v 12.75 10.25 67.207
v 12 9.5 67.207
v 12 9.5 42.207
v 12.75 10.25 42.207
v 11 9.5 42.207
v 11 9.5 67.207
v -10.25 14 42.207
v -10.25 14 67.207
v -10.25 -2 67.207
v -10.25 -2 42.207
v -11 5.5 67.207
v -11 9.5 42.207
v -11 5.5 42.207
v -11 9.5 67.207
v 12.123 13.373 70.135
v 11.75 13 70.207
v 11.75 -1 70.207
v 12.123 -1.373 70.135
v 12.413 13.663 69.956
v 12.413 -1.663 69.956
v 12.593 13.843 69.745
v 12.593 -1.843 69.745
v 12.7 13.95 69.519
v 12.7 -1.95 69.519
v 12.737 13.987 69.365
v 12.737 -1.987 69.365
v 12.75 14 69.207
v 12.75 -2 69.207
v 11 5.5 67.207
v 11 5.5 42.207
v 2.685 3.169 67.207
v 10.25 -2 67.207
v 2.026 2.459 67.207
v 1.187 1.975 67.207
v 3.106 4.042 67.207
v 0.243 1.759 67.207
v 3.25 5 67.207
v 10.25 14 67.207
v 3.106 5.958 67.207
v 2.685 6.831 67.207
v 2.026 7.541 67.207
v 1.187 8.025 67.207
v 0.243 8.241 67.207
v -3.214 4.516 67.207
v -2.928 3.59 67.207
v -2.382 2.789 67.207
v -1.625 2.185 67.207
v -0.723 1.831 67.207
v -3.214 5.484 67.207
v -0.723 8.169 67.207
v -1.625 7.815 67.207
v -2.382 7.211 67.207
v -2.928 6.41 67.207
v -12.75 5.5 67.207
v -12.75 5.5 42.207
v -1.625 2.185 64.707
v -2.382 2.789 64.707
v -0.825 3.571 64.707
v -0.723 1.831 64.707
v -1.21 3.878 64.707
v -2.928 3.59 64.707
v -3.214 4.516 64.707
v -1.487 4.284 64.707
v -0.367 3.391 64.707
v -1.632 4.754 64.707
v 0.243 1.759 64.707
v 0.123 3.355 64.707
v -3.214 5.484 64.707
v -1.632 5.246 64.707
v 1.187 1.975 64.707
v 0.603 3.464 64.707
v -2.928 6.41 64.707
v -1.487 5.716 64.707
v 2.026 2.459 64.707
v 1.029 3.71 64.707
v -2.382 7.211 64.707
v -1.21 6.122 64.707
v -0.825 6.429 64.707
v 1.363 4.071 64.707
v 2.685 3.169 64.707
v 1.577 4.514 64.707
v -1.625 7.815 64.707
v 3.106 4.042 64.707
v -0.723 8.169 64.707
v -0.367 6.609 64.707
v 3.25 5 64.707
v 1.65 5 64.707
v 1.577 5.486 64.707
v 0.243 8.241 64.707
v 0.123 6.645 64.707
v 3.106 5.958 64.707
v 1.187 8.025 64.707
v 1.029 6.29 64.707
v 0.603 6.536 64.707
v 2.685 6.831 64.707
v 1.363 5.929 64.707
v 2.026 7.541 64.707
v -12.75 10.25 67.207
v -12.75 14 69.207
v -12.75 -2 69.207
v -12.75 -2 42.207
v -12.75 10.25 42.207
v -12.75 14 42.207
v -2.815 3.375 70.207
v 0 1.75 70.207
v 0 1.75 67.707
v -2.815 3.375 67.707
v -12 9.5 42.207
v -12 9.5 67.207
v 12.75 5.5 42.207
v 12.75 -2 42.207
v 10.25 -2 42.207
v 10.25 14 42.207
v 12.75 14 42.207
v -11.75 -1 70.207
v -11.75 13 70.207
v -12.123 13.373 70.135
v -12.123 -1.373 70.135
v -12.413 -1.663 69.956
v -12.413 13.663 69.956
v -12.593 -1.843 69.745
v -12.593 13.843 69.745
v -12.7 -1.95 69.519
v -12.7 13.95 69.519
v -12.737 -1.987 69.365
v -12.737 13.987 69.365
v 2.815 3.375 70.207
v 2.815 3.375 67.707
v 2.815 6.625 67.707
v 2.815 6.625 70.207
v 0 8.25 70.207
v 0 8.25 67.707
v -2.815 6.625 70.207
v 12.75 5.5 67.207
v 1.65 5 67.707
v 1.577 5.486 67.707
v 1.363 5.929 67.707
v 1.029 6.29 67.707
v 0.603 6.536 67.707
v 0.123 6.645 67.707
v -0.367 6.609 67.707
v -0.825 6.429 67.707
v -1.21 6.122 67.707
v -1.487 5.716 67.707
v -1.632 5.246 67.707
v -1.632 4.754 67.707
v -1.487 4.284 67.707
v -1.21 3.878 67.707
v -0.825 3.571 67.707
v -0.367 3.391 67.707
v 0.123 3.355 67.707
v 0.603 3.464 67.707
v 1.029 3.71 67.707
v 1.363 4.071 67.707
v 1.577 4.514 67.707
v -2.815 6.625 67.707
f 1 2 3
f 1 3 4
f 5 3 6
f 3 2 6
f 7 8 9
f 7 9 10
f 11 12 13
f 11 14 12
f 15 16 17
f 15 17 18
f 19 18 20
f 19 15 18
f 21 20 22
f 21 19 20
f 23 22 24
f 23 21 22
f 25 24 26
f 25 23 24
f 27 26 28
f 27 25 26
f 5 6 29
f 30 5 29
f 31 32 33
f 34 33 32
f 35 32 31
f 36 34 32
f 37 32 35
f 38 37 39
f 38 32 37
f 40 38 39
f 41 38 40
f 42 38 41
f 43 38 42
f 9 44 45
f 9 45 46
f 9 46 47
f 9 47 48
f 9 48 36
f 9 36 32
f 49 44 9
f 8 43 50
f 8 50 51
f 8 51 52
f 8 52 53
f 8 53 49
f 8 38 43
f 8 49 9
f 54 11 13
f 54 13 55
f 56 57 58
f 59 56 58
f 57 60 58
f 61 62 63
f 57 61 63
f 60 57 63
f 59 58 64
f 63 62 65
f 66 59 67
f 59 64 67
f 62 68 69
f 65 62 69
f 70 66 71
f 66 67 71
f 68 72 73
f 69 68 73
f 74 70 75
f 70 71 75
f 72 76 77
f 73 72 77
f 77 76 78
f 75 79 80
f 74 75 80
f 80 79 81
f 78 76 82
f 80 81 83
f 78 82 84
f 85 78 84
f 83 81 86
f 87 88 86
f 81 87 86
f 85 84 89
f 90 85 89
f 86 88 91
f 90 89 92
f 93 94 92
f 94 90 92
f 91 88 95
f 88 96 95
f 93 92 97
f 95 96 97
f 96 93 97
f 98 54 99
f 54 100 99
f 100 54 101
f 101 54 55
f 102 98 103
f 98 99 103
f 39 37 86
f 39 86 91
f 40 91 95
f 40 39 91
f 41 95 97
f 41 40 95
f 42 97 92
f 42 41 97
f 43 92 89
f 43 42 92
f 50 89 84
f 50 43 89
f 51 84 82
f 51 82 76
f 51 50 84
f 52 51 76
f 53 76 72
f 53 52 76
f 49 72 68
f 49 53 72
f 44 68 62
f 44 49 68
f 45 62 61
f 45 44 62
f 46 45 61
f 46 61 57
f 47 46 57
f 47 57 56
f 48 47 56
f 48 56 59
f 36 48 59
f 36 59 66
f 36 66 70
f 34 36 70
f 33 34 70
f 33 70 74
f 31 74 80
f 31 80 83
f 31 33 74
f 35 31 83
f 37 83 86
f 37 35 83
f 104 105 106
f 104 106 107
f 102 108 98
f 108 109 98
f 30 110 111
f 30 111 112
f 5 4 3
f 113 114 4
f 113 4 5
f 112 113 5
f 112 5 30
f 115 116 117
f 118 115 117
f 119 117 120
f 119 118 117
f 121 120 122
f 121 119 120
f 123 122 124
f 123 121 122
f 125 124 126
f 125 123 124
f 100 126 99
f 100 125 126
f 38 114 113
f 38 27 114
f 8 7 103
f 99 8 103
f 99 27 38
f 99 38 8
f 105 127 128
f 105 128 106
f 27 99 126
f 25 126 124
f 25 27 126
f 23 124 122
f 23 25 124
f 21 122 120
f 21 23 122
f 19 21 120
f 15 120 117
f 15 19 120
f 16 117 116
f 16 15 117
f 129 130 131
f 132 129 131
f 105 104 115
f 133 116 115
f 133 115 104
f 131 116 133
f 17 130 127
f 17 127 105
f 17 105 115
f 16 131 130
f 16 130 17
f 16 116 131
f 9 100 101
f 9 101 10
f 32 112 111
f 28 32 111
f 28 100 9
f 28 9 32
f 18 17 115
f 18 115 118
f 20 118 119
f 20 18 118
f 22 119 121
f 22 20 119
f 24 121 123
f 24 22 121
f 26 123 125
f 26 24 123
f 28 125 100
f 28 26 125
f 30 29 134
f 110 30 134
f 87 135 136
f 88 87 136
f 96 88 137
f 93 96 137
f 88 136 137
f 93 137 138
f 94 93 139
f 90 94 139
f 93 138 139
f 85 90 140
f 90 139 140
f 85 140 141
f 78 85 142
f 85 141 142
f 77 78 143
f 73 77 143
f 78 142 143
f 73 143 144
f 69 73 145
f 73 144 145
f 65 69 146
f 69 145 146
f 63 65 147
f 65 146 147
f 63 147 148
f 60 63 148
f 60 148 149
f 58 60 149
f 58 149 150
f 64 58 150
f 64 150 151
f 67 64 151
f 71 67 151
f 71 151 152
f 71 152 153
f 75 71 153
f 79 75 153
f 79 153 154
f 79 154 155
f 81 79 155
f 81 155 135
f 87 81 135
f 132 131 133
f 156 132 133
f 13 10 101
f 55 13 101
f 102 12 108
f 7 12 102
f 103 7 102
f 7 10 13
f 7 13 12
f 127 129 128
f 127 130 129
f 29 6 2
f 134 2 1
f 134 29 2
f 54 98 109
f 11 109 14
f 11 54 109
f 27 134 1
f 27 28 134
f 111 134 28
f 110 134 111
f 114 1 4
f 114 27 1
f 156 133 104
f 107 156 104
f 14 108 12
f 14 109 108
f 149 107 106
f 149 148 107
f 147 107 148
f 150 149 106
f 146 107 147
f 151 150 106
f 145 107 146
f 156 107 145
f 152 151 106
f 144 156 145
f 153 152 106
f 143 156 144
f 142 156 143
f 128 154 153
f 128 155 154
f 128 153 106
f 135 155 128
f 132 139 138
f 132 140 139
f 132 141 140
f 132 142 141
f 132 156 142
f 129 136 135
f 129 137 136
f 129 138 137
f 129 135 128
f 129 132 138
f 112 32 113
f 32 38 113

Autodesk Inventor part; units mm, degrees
ref_plane "YZ Plane" through (0, 0, 0) normal (1, 0, 0) x (0, 1, 0)
ref_plane "XZ Plane" through (0, 0, 0) normal (0, 1, 0) x (-1, 0, 0)
ref_plane "XY Plane" through (0, 0, 0) normal (0, 0, 1) x (1, 0, 0)
sketch "Эскиз1" plane through (0, 0, 0) normal (0, 1, 0) x (-1, 0, 0)
  line L0 (0, 56.6418) -> (23.7825, 76.5969) construction
  line L1 (44.1942, 76.014) -> (76.014, 44.1942) construction
  line L2 (91.1, 52.2091) -> (52.2091, 91.1) construction
  line L3 (0, 0) -> (74.2462, 74.2462) construction
  arc A0 (92.5543, 49.5852) -> (48.7014, 93.0224) centre (0, 0) ccw construction
  line L4 (52.2091, 91.1) -> (48.6736, 87.5645) construction
  arc A1 (44.1942, 83.085) -> (44.1942, 76.014) centre (47.7297, 79.5495) ccw construction
  line L5 (52.2091, 91.1) -> (48.6736, 87.5645) construction
  line L6 (48.6736, 87.5645) -> (52.2091, 91.1) construction
  spline S0 degree 2 poles (48.6736, 87.5645) (52.2091, 91.1) (48.7014, 93.0224) knots 1 1 1 2 2 2 construction
  line L7 (52.2091, 91.1) -> (48.7014, 93.0224) construction
  line L8 (52.2091, 91.1) -> (48.7014, 93.0224) construction
  arc A2 (48.7014, 93.0224) -> (44.0271, 95.3237) centre (0, 0) ccw construction
  arc A3 (44.0271, 95.3237) -> (43.577, 95.5303) centre (0, 0) ccw construction
  line L9 (42.6652, 95.941) -> (43.577, 95.5303) construction
  line L10 (42.6652, 95.941) -> (43.577, 95.5303) construction
  spline S1 degree 2 poles (42.0492, 94.5734) (42.6652, 95.941) (43.577, 95.5303) knots 1 1 1 2 2 2 construction
  line L11 (42.0492, 94.5734) -> (42.6652, 95.941) construction
  line L12 (42.6652, 95.941) -> (42.0492, 94.5734) construction
  line L13 (0, 0) -> (0, 209.8821) construction
  spline S2 degree 2 poles (-48.6736, 87.5645) (-52.2091, 91.1) (-48.7014, 93.0224) knots 1 1 1 2 2 2 construction
  line L14 (-48.6736, 87.5645) -> (-52.2091, 91.1) construction
  line L15 (-52.2091, 91.1) -> (-48.7014, 93.0224) construction
  arc A4 (-44.1942, 76.014) -> (-44.1942, 83.085) centre (-47.7297, 79.5495) ccw construction
  line L16 (-44.1942, 76.014) -> (-76.014, 44.1942) construction
  arc A5 (-48.7014, 93.0224) -> (-92.5543, 49.5852) centre (0, 0) ccw construction
  arc A6 (-83.085, 44.1942) -> (-76.014, 44.1942) centre (-79.5495, 47.7297) ccw construction
  line L17 (-83.085, 44.1942) -> (-87.3563, 48.4654) construction
  spline S3 degree 2 poles (-48.6736, -87.5645) (-52.2091, -91.1) (-48.7014, -93.0224) knots 1 1 1 2 2 2 construction
  line L18 (-48.6736, -87.5645) -> (-52.2091, -91.1) construction
  line L19 (-52.2091, -91.1) -> (-48.7014, -93.0224) construction
  circle A7 centre (0, 0) radius 35 construction
  line L20 (-46.3155, -73.8927) -> (-73.8927, -46.3155) construction
  arc A8 (-73.8927, -46.3155) -> (-85.2064, -46.3155) centre (-79.5495, -51.9723) ccw construction
  line L21 (-85.2064, -46.3155) -> (-87.5645, -48.6736) construction
  line L22 (-87.5645, -48.6736) -> (-91.1, -52.2091) construction
  spline S4 degree 2 poles (-87.5645, -48.6736) (-91.1, -52.2091) (-92.5543, -49.5852) knots 1 1 1 2 2 2 construction
  line L23 (-91.1, -52.2091) -> (-92.5543, -49.5852) construction
  arc A9 (-92.5543, -49.5852) -> (-48.7014, -93.0224) centre (0, 0) ccw construction
  arc A10 (-92.5543, 49.5852) -> (-92.5543, -49.5852) centre (0, 0) ccw construction
  line L24 (48.6736, -87.5645) -> (46.3155, -85.2064) construction
  arc A11 (-46.3155, -85.2064) -> (-46.3155, -73.8927) centre (-51.9723, -79.5495) ccw construction
  line L25 (-48.6736, -87.5645) -> (-46.3155, -85.2064) construction
  arc A12 (-48.7014, -93.0224) -> (48.7014, -93.0224) centre (0, 0) ccw construction
  arc A13 (46.3155, -73.8927) -> (46.3155, -85.2064) centre (51.9723, -79.5495) ccw construction
  arc A14 (43.577, 95.5303) -> (-43.577, 95.5303) centre (0, 0) ccw construction
  arc A15 (23.7825, 76.5969) -> (0, 67.941) centre (0, 104.941) ccw construction
  line L26 (0, 56.6418) -> (-35.5516, 86.4744) construction
  line L27 (44.0271, 95.3237) -> (44.0271, 127.8162) construction
  ellipse E0 centre (0, 102.7511) end of major axis (44.0271, 102.7511) minor radius 27.5932 (42.0492, 94.5734) -> (35.2734, 86.2384) ccw construction
  line L28 (42.6652, 95.941) -> (-42.6652, 95.941) construction
  ellipse E1 centre (0, 102.7511) end of major axis (44.5159, 105.2445) minor radius 28.887 (35.2734, 86.2384) -> (42.0492, 94.5734) ccw construction
  line L29 (23.7825, 76.5969) -> (35.2734, 86.2384) construction
  arc A16 (0, 67.941) -> (23.7825, 76.5969) centre (0, 104.941) ccw construction
  arc A17 (-23.7825, 76.5969) -> (0, 67.941) centre (0, 104.941) ccw construction
  line L30 (-23.7825, 76.5969) -> (-35.2734, 86.2384) construction
  line L31 (-42.6652, 95.941) -> (-42.0492, 94.5734) construction
  arc A18 (-43.577, 95.5303) -> (-48.7014, 93.0224) centre (0, 0) ccw construction
  line L32 (-42.6652, 95.941) -> (-43.577, 95.5303) construction
  spline S5 degree 2 poles (-42.0492, 94.5734) (-42.6652, 95.941) (-43.577, 95.5303) knots 1 1 1 2 2 2 construction
  line L33 (-42.0492, 94.5734) -> (-42.6652, 95.941) construction
  line L34 (-42.6652, 95.941) -> (-43.577, 95.5303) construction
  line L35 (-42.6652, 95.941) -> (-43.577, 95.5303) construction
  spline S6 degree 2 poles (-42.0492, 94.5734) (-42.6652, 95.941) (-43.577, 95.5303) knots 1 1 1 2 2 2 construction
  line L36 (-42.0492, 94.5734) -> (-42.6652, 95.941) construction
  ellipse E2 centre (0, 102.7511) end of major axis (-44.5159, 105.2445) minor radius 28.887 (-42.0492, 94.5734) -> (-35.2734, 86.2384) ccw construction
  line L37 (83.085, 44.1942) -> (87.5645, 48.6736) construction
  arc A19 (76.014, 44.1942) -> (83.085, 44.1942) centre (79.5495, 47.7297) ccw construction
  spline S7 degree 2 poles (48.6736, -87.5645) (52.2091, -91.1) (48.7014, -93.0224) knots 1 1 1 2 2 2 construction
  line L38 (48.6736, -87.5645) -> (52.2091, -91.1) construction
  line L39 (52.2091, -91.1) -> (48.7014, -93.0224) construction
  line L40 (46.3155, -73.8927) -> (73.8927, -46.3155) construction
  arc A20 (85.2064, -46.3155) -> (73.8927, -46.3155) centre (79.5495, -51.9723) ccw construction
  line L41 (85.2064, -46.3155) -> (87.5645, -48.6736) construction
  spline S8 degree 2 poles (87.5645, -48.6736) (91.1, -52.2091) (92.5543, -49.5852) knots 1 1 1 2 2 2 construction
  line L42 (87.5645, -48.6736) -> (91.1, -52.2091) construction
  line L43 (91.1, -52.2091) -> (92.5543, -49.5852) construction
  arc A21 (92.5543, -49.5852) -> (92.5543, 49.5852) centre (0, 0) ccw construction
  arc A22 (48.7014, -93.0224) -> (92.5543, -49.5852) centre (0, 0) ccw construction
  arc A23 (28.5452, 71.4571) -> (-28.5452, 71.4571) centre (0, 104.941) ccw construction
  line L44 (-83.085, 34.2947) -> (-90.6891, 41.8987) construction
  line L45 (-93.5297, 47.6709) -> (-92.5543, 49.5852) construction
  line L46 (-29.1816, 81.127) -> (-76.014, 34.2947) construction
  arc A24 (-83.085, 34.2947) -> (-76.014, 34.2947) centre (-79.5495, 37.8302) ccw construction
  line L47 (-34.1491, 76.1596) -> (-28.5452, 71.4571) construction
  arc A25 (-30.6393, 73.2144) -> (-37.3889, 72.9198) centre (-33.8534, 69.3842) ccw construction
  arc A26 (-90.6891, 41.8987) -> (-87.3563, 48.4654) centre (0, 0) ccw construction
  arc A27 (37.3889, 72.9198) -> (30.6393, 73.2144) centre (33.8534, 69.3842) ccw construction
  line L48 (29.1816, 81.127) -> (76.014, 34.2947) construction
  arc A28 (76.014, 34.2947) -> (83.085, 34.2947) centre (79.5495, 37.8302) ccw construction
  line L49 (83.085, 34.2947) -> (90.6891, 41.8987) construction
  arc A29 (76.014, 44.1942) -> (83.085, 44.1942) centre (79.5495, 47.7297) ccw construction
  line L50 (44.1942, 76.014) -> (76.014, 44.1942) construction
  arc A30 (44.1942, 83.085) -> (44.1942, 76.014) centre (47.7297, 79.5495) ccw construction
  arc A31 (5.5413, 61.2914) -> (28.5452, 71.4571) centre (0, 104.941) ccw
  arc A32 (-28.5452, 71.4571) -> (5.5413, 61.2914) centre (0, 104.941) ccw
  line L51 (34.1491, 76.1596) -> (28.5452, 71.4571) construction
  arc A33 (-87.3563, 48.4654) -> (-90.6891, 41.8987) centre (0, 0) ccw construction
  line L52 (83.085, 44.1942) -> (87.3563, 48.4654) construction
  arc A34 (90.6891, 41.8987) -> (87.3563, 48.4654) centre (0, 0) ccw construction
  line L53 (-44.1942, 83.085) -> (-48.6736, 87.5645) construction
  line L54 (44.0271, 95.3237) -> (43.577, 95.5303) construction
  line L55 (48.6736, 87.5645) -> (44.1942, 83.085) construction
  line L56 (0, 104.941) -> (-23.6028, 54.3247) construction
  circle A35 centre (31.1916, 76.2887) radius 2 construction
  line L57 (29.1816, 81.127) -> (23.7825, 76.5969)
  line L58 (29.1816, 81.127) -> (34.1491, 76.1596)
  line L59 (34.1491, 76.1596) -> (28.5452, 71.4571)
  line L60 (-28.5452, 71.4571) -> (-34.1491, 76.1596)
  line L61 (-23.7825, 76.5969) -> (-29.1816, 81.127)
  line L62 (-29.1816, 81.127) -> (-34.1491, 76.1596)
  arc A36 (-26.6462, 78.9996) -> (-31.2232, 73.7044) centre (-28.9734, 76.3855) ccw
  arc A37 (31.2232, 73.7044) -> (26.6462, 78.9996) centre (28.9734, 76.3855) ccw
  line L63 (12.75, 58.0269) -> (-12.75, 58.0269)
  line L64 (0, 67.941) -> (0, 64.941) construction
  line L65 (-12.75, 58.0269) -> (-12.75, 67.2072) construction
  line L66 (12.75, 58.0269) -> (12.75, 67.2072) construction
  arc A38 (-12.75, 67.2072) -> (12.75, 67.2072) centre (0, 101.941) ccw
  line L67 (12.75, 67.2072) -> (12.75, 70.2072)
  line L68 (-12.75, 70.2072) -> (-12.75, 70.2072) construction
  line L69 (-12.75, 67.2072) -> (-12.75, 70.2072)
  line L70 (10.1, 59.4125) -> (-10.1, 59.4125) construction
  line L71 (12.75, 70.2072) -> (-12.75, 70.2072)
  line L72 (12.75, 67.2072) -> (-12.75, 67.2072)
  point P0 (60.1041, 60.1041)
  point P1 (40.6586, 79.5495)
  point P2 (79.5495, 40.6586)
  point P3 (0, 105)
  point P4 (-87.5645, 48.6736)
  point P5 (-23.542, 76.3968)
  point P6 (-34.9935, 86.0061)
  point P7 (0, 95.941)
  point P8 (-94.5192, 45.7288)
  point P9 (-13.2817, 58.6489)
  point P10 (-28.5452, 71.4571)
  point P11 (13.2817, 58.6489)
  point P12 (-15.6369, 71.4076)
  point P13 (-26.8032, 79.1314)
  point P14 (-31.2232, 73.7044)
  point P15 (26.8032, 79.1314)
  dimension "d67" = 44.5856
  dimension "d48" = 74
  dimension "d49" = 100
  dimension "d50" = 28
  dimension "d51" = 15
  dimension "d52" = 45
  dimension "d53" = 55
  dimension "d54" = 16.3348
  dimension "d55" = 27.5
  dimension "d56" = 5
  dimension "d57" = 5
  dimension "d58" = 1
  dimension "d59" = 1.5
  dimension "d60" = 1.5
  dimension "d61" = 1
  dimension "d62" = 4
  dimension "d63" = 70
  dimension "d64" = 85
  dimension "d65" = 105
  dimension "d66" = 1.3619
  dimension "d68" = 88
  dimension "d69" = 7
  dimension "d70" = 5
  dimension "d71" = 7
  dimension "d72" = 5
  dimension "d73" = 7
  dimension "d74" = 5
  dimension "d75" = 5.1
  dimension "d78" = 4
  dimension "d166" = 25.5
  dimension "d169" = 3
  dimension "d171" = 3
  dimension "d172" = 3
  dimension "d173" = 20.2
extrude "Выдавливание7" add sketch "Эскиз1" along normal blind 14 contours L69 L71 L67 L72
sketch "Эскиз10" plane through (12.75, 0, 67.2072) normal (0, 0, -1) x (-1, 0, 0)
  line L0 (25.5, 0) -> (0, 0) construction
  line L1 (0, 0) -> (0, 14) construction
  line L2 (25.5, 14) -> (0, 14) construction
  line L3 (25.5, 0) -> (25.5, 14) construction
  line L4 (25.5, 14) -> (0, 14) construction
  line L5 (12.75, 14) -> (12.75, 0) construction
  line L6 (-0.25, 15.8948) -> (-0.25, -2.2577) construction
  line L7 (0, 14) -> (2.5, 14)
  line L8 (2.5, 14) -> (2.5, 0)
  line L9 (2.5, 0) -> (0, 0)
  line L10 (0, 0) -> (0, 14)
  line L11 (0, 9) -> (2.5, 9) construction
  line L12 (0, 0) -> (0, 14) construction
  line L13 (0, 9.5) -> (1.75, 9.5)
  line L14 (1.75, 9.5) -> (1.75, 5.5)
  line L15 (1.75, 5.5) -> (0, 5.5)
  line L16 (0, 5.5) -> (0, 9.5) construction
  line L17 (0, 9) -> (1.25, 9) construction
  line L18 (1.25, 9) -> (1.25, 6) construction
  line L19 (1.25, 6) -> (0, 6) construction
  line L20 (0, 6) -> (0, 9) construction
  line L21 (1.25, 9) -> (0, 10.25)
  line L22 (25.5, 0) -> (25.5, 14) construction
  line L23 (25.5, 14) -> (23, 14)
  line L24 (23, 14) -> (23, 0)
  line L25 (23, 0) -> (25.5, 0)
  line L26 (25.5, 0) -> (25.5, 14)
  line L27 (25.5, 9) -> (23, 9) construction
  line L28 (25.5, 0) -> (25.5, 14) construction
  line L29 (25.5, 9.5) -> (23.75, 9.5)
  line L30 (23.75, 9.5) -> (23.75, 5.5)
  line L31 (23.75, 5.5) -> (25.5, 5.5)
  line L32 (25.5, 5.5) -> (25.5, 9.5) construction
  line L33 (25.5, 9) -> (24.25, 9) construction
  line L34 (24.25, 9) -> (24.25, 6) construction
  line L35 (24.25, 6) -> (25.5, 6) construction
  line L36 (25.5, 6) -> (25.5, 9) construction
  line L37 (24.25, 9) -> (25.5, 10.25)
  point P0 (24.75, 9.5)
  point P1 (0, 5.5)
  point P2 (0, 10.25)
  point P3 (0.75, 9.5)
  dimension "d215" = 26
  dimension "d216" = 20.5
  dimension "d218" = 3
  dimension "d219" = 1.5
  dimension "d220" = 0.5
  dimension "d221" = 0.5
  dimension "d222" = 0.5
  dimension "d223" = 135
  dimension "d237" = 5.5
extrude "Выдавливание16" add sketch "Эскиз10" along normal blind 25 contours L7 L8 L9 L10 L15 L14 L13 L21 | L26 L37 L29 L30 L31 L25 L24 L23
sketch "Эскиз12" plane through (-12.75, 0, 70.2072) normal (0, 0, 1) x (1, 0, 0)
  line L0 (0, 14) -> (2.5, 14) construction
  line L1 (2.5, 14) -> (2.5, 0) construction
  line L2 (2.5, 0) -> (0, 0) construction
  line L3 (0, 0) -> (0, 5.5) construction
  line L4 (0, 5.5) -> (1.75, 5.5) construction
  line L5 (1.75, 5.5) -> (1.75, 9.5) construction
  line L6 (1.75, 9.5) -> (0.75, 9.5) construction
  line L7 (0.75, 9.5) -> (0, 10.25) construction
  line L8 (0, 10.25) -> (0, 14) construction
  line L9 (0, 0) -> (25.5, 0) construction
  line L10 (25.5, 0) -> (25.5, 14) construction
  line L11 (0, 14) -> (25.5, 14) construction
  line L12 (0, 0) -> (0, 14) construction
  line L13 (25.5, 14) -> (25.5, 10.25) construction
  line L14 (25.5, 10.25) -> (24.75, 9.5) construction
  line L15 (24.75, 9.5) -> (23.75, 9.5) construction
  line L16 (23.75, 9.5) -> (23.75, 5.5) construction
  line L17 (23.75, 5.5) -> (25.5, 5.5) construction
  line L18 (25.5, 5.5) -> (25.5, 0) construction
  line L19 (25.5, 0) -> (23, 0) construction
  line L20 (23, 0) -> (23, 14) construction
  line L21 (23, 14) -> (25.5, 14) construction
  line L22 (23, 0) -> (23, 14) construction
  line L23 (0, 14) -> (25.5, 14) construction
  line L24 (23, 14) -> (25.5, 14) construction
  line L25 (23, 14) -> (2.5, 14) construction
  line L26 (0, 14) -> (2.5, 14) construction
  line L27 (25.5, 0) -> (25.5, 14) construction
  line L28 (25.5, 5.5) -> (25.5, 10.25) construction
  line L29 (0, 0) -> (0, 14) construction
  line L30 (0, 14) -> (25.5, 14) construction
  line L31 (12.75, 14) -> (12.75, 0) construction
  circle A0 centre (12.75, 5) radius 3.25
  circle A1 centre (12.75, 5) radius 1.65
  line L32 (12.75, 5) -> (15.5646, 6.625) construction
  line L33 (12.75, 5) -> (9.9354, 6.625) construction
  line L34 (12.75, 5) -> (16, 5) construction
  line L35 (12.75, 5) -> (15.5646, 3.375) construction
  line L36 (12.75, 5) -> (9.9354, 3.375) construction
  line L37 (15.5646, 6.625) -> (12.75, 8.25)
  line L38 (12.75, 8.25) -> (9.9354, 6.625)
  line L39 (9.9354, 6.625) -> (9.9354, 3.375)
  line L40 (15.5646, 6.625) -> (15.5646, 3.375)
  line L41 (15.5646, 3.375) -> (12.75, 1.75)
  line L42 (12.75, 1.75) -> (9.9354, 3.375)
  dimension "d226" = 6.5
  dimension "d229" = 3.3
  dimension "d238" = 5
  dimension "d239" = 60
extrude "Выдавливание17" add sketch "Эскиз12" against normal blind 5.5 contours A0 L40 | L37 A0 | L40 L41 L42 L39 L38 L37 | A0 L41 | L38 A0 | A0 L42 | L39 A0 | A1
extrude "Выдавливание18" cut sketch "Эскиз12" against normal blind 5.5 contours A1
extrude "Выдавливание19" cut sketch "Эскиз12" against normal blind 2.5 contours L40 L41 L42 L39 L38 L37
fillet "Сопряжение1" [suppressed]
sketch "Эскиз14" plane through (0, 0, 0) normal (0, -1, 0) x (1, 0, 0)
  line L0 (-12.75, 70.2072) -> (12.75, 70.2072) projected
  line L1 (-12.75, 70.2072) -> (-12.75, 42.2072) projected
  line L2 (-10.25, 42.2072) -> (-12.75, 42.2072) projected
  line L3 (-10.25, 67.2072) -> (-10.25, 42.2072) projected
  line L4 (10.25, 67.2072) -> (-10.25, 67.2072) projected
  line L5 (10.25, 67.2072) -> (10.25, 42.2072) projected
  line L6 (12.75, 42.2072) -> (10.25, 42.2072) projected
  line L7 (12.75, 70.2072) -> (12.75, 42.2072) projected
  point P0 (0, 0)
extrude "Выдавливание20" add sketch "Эскиз14" along normal blind 2
fillet "Сопряжение2" radius 1 4 edges at (0, 14, 70.2072) (12.75, 6, 70.2072) (0, -2, 70.2072) (-12.75, 6, 70.2072)
properties part number "_3DПЕЧАТЬ"
